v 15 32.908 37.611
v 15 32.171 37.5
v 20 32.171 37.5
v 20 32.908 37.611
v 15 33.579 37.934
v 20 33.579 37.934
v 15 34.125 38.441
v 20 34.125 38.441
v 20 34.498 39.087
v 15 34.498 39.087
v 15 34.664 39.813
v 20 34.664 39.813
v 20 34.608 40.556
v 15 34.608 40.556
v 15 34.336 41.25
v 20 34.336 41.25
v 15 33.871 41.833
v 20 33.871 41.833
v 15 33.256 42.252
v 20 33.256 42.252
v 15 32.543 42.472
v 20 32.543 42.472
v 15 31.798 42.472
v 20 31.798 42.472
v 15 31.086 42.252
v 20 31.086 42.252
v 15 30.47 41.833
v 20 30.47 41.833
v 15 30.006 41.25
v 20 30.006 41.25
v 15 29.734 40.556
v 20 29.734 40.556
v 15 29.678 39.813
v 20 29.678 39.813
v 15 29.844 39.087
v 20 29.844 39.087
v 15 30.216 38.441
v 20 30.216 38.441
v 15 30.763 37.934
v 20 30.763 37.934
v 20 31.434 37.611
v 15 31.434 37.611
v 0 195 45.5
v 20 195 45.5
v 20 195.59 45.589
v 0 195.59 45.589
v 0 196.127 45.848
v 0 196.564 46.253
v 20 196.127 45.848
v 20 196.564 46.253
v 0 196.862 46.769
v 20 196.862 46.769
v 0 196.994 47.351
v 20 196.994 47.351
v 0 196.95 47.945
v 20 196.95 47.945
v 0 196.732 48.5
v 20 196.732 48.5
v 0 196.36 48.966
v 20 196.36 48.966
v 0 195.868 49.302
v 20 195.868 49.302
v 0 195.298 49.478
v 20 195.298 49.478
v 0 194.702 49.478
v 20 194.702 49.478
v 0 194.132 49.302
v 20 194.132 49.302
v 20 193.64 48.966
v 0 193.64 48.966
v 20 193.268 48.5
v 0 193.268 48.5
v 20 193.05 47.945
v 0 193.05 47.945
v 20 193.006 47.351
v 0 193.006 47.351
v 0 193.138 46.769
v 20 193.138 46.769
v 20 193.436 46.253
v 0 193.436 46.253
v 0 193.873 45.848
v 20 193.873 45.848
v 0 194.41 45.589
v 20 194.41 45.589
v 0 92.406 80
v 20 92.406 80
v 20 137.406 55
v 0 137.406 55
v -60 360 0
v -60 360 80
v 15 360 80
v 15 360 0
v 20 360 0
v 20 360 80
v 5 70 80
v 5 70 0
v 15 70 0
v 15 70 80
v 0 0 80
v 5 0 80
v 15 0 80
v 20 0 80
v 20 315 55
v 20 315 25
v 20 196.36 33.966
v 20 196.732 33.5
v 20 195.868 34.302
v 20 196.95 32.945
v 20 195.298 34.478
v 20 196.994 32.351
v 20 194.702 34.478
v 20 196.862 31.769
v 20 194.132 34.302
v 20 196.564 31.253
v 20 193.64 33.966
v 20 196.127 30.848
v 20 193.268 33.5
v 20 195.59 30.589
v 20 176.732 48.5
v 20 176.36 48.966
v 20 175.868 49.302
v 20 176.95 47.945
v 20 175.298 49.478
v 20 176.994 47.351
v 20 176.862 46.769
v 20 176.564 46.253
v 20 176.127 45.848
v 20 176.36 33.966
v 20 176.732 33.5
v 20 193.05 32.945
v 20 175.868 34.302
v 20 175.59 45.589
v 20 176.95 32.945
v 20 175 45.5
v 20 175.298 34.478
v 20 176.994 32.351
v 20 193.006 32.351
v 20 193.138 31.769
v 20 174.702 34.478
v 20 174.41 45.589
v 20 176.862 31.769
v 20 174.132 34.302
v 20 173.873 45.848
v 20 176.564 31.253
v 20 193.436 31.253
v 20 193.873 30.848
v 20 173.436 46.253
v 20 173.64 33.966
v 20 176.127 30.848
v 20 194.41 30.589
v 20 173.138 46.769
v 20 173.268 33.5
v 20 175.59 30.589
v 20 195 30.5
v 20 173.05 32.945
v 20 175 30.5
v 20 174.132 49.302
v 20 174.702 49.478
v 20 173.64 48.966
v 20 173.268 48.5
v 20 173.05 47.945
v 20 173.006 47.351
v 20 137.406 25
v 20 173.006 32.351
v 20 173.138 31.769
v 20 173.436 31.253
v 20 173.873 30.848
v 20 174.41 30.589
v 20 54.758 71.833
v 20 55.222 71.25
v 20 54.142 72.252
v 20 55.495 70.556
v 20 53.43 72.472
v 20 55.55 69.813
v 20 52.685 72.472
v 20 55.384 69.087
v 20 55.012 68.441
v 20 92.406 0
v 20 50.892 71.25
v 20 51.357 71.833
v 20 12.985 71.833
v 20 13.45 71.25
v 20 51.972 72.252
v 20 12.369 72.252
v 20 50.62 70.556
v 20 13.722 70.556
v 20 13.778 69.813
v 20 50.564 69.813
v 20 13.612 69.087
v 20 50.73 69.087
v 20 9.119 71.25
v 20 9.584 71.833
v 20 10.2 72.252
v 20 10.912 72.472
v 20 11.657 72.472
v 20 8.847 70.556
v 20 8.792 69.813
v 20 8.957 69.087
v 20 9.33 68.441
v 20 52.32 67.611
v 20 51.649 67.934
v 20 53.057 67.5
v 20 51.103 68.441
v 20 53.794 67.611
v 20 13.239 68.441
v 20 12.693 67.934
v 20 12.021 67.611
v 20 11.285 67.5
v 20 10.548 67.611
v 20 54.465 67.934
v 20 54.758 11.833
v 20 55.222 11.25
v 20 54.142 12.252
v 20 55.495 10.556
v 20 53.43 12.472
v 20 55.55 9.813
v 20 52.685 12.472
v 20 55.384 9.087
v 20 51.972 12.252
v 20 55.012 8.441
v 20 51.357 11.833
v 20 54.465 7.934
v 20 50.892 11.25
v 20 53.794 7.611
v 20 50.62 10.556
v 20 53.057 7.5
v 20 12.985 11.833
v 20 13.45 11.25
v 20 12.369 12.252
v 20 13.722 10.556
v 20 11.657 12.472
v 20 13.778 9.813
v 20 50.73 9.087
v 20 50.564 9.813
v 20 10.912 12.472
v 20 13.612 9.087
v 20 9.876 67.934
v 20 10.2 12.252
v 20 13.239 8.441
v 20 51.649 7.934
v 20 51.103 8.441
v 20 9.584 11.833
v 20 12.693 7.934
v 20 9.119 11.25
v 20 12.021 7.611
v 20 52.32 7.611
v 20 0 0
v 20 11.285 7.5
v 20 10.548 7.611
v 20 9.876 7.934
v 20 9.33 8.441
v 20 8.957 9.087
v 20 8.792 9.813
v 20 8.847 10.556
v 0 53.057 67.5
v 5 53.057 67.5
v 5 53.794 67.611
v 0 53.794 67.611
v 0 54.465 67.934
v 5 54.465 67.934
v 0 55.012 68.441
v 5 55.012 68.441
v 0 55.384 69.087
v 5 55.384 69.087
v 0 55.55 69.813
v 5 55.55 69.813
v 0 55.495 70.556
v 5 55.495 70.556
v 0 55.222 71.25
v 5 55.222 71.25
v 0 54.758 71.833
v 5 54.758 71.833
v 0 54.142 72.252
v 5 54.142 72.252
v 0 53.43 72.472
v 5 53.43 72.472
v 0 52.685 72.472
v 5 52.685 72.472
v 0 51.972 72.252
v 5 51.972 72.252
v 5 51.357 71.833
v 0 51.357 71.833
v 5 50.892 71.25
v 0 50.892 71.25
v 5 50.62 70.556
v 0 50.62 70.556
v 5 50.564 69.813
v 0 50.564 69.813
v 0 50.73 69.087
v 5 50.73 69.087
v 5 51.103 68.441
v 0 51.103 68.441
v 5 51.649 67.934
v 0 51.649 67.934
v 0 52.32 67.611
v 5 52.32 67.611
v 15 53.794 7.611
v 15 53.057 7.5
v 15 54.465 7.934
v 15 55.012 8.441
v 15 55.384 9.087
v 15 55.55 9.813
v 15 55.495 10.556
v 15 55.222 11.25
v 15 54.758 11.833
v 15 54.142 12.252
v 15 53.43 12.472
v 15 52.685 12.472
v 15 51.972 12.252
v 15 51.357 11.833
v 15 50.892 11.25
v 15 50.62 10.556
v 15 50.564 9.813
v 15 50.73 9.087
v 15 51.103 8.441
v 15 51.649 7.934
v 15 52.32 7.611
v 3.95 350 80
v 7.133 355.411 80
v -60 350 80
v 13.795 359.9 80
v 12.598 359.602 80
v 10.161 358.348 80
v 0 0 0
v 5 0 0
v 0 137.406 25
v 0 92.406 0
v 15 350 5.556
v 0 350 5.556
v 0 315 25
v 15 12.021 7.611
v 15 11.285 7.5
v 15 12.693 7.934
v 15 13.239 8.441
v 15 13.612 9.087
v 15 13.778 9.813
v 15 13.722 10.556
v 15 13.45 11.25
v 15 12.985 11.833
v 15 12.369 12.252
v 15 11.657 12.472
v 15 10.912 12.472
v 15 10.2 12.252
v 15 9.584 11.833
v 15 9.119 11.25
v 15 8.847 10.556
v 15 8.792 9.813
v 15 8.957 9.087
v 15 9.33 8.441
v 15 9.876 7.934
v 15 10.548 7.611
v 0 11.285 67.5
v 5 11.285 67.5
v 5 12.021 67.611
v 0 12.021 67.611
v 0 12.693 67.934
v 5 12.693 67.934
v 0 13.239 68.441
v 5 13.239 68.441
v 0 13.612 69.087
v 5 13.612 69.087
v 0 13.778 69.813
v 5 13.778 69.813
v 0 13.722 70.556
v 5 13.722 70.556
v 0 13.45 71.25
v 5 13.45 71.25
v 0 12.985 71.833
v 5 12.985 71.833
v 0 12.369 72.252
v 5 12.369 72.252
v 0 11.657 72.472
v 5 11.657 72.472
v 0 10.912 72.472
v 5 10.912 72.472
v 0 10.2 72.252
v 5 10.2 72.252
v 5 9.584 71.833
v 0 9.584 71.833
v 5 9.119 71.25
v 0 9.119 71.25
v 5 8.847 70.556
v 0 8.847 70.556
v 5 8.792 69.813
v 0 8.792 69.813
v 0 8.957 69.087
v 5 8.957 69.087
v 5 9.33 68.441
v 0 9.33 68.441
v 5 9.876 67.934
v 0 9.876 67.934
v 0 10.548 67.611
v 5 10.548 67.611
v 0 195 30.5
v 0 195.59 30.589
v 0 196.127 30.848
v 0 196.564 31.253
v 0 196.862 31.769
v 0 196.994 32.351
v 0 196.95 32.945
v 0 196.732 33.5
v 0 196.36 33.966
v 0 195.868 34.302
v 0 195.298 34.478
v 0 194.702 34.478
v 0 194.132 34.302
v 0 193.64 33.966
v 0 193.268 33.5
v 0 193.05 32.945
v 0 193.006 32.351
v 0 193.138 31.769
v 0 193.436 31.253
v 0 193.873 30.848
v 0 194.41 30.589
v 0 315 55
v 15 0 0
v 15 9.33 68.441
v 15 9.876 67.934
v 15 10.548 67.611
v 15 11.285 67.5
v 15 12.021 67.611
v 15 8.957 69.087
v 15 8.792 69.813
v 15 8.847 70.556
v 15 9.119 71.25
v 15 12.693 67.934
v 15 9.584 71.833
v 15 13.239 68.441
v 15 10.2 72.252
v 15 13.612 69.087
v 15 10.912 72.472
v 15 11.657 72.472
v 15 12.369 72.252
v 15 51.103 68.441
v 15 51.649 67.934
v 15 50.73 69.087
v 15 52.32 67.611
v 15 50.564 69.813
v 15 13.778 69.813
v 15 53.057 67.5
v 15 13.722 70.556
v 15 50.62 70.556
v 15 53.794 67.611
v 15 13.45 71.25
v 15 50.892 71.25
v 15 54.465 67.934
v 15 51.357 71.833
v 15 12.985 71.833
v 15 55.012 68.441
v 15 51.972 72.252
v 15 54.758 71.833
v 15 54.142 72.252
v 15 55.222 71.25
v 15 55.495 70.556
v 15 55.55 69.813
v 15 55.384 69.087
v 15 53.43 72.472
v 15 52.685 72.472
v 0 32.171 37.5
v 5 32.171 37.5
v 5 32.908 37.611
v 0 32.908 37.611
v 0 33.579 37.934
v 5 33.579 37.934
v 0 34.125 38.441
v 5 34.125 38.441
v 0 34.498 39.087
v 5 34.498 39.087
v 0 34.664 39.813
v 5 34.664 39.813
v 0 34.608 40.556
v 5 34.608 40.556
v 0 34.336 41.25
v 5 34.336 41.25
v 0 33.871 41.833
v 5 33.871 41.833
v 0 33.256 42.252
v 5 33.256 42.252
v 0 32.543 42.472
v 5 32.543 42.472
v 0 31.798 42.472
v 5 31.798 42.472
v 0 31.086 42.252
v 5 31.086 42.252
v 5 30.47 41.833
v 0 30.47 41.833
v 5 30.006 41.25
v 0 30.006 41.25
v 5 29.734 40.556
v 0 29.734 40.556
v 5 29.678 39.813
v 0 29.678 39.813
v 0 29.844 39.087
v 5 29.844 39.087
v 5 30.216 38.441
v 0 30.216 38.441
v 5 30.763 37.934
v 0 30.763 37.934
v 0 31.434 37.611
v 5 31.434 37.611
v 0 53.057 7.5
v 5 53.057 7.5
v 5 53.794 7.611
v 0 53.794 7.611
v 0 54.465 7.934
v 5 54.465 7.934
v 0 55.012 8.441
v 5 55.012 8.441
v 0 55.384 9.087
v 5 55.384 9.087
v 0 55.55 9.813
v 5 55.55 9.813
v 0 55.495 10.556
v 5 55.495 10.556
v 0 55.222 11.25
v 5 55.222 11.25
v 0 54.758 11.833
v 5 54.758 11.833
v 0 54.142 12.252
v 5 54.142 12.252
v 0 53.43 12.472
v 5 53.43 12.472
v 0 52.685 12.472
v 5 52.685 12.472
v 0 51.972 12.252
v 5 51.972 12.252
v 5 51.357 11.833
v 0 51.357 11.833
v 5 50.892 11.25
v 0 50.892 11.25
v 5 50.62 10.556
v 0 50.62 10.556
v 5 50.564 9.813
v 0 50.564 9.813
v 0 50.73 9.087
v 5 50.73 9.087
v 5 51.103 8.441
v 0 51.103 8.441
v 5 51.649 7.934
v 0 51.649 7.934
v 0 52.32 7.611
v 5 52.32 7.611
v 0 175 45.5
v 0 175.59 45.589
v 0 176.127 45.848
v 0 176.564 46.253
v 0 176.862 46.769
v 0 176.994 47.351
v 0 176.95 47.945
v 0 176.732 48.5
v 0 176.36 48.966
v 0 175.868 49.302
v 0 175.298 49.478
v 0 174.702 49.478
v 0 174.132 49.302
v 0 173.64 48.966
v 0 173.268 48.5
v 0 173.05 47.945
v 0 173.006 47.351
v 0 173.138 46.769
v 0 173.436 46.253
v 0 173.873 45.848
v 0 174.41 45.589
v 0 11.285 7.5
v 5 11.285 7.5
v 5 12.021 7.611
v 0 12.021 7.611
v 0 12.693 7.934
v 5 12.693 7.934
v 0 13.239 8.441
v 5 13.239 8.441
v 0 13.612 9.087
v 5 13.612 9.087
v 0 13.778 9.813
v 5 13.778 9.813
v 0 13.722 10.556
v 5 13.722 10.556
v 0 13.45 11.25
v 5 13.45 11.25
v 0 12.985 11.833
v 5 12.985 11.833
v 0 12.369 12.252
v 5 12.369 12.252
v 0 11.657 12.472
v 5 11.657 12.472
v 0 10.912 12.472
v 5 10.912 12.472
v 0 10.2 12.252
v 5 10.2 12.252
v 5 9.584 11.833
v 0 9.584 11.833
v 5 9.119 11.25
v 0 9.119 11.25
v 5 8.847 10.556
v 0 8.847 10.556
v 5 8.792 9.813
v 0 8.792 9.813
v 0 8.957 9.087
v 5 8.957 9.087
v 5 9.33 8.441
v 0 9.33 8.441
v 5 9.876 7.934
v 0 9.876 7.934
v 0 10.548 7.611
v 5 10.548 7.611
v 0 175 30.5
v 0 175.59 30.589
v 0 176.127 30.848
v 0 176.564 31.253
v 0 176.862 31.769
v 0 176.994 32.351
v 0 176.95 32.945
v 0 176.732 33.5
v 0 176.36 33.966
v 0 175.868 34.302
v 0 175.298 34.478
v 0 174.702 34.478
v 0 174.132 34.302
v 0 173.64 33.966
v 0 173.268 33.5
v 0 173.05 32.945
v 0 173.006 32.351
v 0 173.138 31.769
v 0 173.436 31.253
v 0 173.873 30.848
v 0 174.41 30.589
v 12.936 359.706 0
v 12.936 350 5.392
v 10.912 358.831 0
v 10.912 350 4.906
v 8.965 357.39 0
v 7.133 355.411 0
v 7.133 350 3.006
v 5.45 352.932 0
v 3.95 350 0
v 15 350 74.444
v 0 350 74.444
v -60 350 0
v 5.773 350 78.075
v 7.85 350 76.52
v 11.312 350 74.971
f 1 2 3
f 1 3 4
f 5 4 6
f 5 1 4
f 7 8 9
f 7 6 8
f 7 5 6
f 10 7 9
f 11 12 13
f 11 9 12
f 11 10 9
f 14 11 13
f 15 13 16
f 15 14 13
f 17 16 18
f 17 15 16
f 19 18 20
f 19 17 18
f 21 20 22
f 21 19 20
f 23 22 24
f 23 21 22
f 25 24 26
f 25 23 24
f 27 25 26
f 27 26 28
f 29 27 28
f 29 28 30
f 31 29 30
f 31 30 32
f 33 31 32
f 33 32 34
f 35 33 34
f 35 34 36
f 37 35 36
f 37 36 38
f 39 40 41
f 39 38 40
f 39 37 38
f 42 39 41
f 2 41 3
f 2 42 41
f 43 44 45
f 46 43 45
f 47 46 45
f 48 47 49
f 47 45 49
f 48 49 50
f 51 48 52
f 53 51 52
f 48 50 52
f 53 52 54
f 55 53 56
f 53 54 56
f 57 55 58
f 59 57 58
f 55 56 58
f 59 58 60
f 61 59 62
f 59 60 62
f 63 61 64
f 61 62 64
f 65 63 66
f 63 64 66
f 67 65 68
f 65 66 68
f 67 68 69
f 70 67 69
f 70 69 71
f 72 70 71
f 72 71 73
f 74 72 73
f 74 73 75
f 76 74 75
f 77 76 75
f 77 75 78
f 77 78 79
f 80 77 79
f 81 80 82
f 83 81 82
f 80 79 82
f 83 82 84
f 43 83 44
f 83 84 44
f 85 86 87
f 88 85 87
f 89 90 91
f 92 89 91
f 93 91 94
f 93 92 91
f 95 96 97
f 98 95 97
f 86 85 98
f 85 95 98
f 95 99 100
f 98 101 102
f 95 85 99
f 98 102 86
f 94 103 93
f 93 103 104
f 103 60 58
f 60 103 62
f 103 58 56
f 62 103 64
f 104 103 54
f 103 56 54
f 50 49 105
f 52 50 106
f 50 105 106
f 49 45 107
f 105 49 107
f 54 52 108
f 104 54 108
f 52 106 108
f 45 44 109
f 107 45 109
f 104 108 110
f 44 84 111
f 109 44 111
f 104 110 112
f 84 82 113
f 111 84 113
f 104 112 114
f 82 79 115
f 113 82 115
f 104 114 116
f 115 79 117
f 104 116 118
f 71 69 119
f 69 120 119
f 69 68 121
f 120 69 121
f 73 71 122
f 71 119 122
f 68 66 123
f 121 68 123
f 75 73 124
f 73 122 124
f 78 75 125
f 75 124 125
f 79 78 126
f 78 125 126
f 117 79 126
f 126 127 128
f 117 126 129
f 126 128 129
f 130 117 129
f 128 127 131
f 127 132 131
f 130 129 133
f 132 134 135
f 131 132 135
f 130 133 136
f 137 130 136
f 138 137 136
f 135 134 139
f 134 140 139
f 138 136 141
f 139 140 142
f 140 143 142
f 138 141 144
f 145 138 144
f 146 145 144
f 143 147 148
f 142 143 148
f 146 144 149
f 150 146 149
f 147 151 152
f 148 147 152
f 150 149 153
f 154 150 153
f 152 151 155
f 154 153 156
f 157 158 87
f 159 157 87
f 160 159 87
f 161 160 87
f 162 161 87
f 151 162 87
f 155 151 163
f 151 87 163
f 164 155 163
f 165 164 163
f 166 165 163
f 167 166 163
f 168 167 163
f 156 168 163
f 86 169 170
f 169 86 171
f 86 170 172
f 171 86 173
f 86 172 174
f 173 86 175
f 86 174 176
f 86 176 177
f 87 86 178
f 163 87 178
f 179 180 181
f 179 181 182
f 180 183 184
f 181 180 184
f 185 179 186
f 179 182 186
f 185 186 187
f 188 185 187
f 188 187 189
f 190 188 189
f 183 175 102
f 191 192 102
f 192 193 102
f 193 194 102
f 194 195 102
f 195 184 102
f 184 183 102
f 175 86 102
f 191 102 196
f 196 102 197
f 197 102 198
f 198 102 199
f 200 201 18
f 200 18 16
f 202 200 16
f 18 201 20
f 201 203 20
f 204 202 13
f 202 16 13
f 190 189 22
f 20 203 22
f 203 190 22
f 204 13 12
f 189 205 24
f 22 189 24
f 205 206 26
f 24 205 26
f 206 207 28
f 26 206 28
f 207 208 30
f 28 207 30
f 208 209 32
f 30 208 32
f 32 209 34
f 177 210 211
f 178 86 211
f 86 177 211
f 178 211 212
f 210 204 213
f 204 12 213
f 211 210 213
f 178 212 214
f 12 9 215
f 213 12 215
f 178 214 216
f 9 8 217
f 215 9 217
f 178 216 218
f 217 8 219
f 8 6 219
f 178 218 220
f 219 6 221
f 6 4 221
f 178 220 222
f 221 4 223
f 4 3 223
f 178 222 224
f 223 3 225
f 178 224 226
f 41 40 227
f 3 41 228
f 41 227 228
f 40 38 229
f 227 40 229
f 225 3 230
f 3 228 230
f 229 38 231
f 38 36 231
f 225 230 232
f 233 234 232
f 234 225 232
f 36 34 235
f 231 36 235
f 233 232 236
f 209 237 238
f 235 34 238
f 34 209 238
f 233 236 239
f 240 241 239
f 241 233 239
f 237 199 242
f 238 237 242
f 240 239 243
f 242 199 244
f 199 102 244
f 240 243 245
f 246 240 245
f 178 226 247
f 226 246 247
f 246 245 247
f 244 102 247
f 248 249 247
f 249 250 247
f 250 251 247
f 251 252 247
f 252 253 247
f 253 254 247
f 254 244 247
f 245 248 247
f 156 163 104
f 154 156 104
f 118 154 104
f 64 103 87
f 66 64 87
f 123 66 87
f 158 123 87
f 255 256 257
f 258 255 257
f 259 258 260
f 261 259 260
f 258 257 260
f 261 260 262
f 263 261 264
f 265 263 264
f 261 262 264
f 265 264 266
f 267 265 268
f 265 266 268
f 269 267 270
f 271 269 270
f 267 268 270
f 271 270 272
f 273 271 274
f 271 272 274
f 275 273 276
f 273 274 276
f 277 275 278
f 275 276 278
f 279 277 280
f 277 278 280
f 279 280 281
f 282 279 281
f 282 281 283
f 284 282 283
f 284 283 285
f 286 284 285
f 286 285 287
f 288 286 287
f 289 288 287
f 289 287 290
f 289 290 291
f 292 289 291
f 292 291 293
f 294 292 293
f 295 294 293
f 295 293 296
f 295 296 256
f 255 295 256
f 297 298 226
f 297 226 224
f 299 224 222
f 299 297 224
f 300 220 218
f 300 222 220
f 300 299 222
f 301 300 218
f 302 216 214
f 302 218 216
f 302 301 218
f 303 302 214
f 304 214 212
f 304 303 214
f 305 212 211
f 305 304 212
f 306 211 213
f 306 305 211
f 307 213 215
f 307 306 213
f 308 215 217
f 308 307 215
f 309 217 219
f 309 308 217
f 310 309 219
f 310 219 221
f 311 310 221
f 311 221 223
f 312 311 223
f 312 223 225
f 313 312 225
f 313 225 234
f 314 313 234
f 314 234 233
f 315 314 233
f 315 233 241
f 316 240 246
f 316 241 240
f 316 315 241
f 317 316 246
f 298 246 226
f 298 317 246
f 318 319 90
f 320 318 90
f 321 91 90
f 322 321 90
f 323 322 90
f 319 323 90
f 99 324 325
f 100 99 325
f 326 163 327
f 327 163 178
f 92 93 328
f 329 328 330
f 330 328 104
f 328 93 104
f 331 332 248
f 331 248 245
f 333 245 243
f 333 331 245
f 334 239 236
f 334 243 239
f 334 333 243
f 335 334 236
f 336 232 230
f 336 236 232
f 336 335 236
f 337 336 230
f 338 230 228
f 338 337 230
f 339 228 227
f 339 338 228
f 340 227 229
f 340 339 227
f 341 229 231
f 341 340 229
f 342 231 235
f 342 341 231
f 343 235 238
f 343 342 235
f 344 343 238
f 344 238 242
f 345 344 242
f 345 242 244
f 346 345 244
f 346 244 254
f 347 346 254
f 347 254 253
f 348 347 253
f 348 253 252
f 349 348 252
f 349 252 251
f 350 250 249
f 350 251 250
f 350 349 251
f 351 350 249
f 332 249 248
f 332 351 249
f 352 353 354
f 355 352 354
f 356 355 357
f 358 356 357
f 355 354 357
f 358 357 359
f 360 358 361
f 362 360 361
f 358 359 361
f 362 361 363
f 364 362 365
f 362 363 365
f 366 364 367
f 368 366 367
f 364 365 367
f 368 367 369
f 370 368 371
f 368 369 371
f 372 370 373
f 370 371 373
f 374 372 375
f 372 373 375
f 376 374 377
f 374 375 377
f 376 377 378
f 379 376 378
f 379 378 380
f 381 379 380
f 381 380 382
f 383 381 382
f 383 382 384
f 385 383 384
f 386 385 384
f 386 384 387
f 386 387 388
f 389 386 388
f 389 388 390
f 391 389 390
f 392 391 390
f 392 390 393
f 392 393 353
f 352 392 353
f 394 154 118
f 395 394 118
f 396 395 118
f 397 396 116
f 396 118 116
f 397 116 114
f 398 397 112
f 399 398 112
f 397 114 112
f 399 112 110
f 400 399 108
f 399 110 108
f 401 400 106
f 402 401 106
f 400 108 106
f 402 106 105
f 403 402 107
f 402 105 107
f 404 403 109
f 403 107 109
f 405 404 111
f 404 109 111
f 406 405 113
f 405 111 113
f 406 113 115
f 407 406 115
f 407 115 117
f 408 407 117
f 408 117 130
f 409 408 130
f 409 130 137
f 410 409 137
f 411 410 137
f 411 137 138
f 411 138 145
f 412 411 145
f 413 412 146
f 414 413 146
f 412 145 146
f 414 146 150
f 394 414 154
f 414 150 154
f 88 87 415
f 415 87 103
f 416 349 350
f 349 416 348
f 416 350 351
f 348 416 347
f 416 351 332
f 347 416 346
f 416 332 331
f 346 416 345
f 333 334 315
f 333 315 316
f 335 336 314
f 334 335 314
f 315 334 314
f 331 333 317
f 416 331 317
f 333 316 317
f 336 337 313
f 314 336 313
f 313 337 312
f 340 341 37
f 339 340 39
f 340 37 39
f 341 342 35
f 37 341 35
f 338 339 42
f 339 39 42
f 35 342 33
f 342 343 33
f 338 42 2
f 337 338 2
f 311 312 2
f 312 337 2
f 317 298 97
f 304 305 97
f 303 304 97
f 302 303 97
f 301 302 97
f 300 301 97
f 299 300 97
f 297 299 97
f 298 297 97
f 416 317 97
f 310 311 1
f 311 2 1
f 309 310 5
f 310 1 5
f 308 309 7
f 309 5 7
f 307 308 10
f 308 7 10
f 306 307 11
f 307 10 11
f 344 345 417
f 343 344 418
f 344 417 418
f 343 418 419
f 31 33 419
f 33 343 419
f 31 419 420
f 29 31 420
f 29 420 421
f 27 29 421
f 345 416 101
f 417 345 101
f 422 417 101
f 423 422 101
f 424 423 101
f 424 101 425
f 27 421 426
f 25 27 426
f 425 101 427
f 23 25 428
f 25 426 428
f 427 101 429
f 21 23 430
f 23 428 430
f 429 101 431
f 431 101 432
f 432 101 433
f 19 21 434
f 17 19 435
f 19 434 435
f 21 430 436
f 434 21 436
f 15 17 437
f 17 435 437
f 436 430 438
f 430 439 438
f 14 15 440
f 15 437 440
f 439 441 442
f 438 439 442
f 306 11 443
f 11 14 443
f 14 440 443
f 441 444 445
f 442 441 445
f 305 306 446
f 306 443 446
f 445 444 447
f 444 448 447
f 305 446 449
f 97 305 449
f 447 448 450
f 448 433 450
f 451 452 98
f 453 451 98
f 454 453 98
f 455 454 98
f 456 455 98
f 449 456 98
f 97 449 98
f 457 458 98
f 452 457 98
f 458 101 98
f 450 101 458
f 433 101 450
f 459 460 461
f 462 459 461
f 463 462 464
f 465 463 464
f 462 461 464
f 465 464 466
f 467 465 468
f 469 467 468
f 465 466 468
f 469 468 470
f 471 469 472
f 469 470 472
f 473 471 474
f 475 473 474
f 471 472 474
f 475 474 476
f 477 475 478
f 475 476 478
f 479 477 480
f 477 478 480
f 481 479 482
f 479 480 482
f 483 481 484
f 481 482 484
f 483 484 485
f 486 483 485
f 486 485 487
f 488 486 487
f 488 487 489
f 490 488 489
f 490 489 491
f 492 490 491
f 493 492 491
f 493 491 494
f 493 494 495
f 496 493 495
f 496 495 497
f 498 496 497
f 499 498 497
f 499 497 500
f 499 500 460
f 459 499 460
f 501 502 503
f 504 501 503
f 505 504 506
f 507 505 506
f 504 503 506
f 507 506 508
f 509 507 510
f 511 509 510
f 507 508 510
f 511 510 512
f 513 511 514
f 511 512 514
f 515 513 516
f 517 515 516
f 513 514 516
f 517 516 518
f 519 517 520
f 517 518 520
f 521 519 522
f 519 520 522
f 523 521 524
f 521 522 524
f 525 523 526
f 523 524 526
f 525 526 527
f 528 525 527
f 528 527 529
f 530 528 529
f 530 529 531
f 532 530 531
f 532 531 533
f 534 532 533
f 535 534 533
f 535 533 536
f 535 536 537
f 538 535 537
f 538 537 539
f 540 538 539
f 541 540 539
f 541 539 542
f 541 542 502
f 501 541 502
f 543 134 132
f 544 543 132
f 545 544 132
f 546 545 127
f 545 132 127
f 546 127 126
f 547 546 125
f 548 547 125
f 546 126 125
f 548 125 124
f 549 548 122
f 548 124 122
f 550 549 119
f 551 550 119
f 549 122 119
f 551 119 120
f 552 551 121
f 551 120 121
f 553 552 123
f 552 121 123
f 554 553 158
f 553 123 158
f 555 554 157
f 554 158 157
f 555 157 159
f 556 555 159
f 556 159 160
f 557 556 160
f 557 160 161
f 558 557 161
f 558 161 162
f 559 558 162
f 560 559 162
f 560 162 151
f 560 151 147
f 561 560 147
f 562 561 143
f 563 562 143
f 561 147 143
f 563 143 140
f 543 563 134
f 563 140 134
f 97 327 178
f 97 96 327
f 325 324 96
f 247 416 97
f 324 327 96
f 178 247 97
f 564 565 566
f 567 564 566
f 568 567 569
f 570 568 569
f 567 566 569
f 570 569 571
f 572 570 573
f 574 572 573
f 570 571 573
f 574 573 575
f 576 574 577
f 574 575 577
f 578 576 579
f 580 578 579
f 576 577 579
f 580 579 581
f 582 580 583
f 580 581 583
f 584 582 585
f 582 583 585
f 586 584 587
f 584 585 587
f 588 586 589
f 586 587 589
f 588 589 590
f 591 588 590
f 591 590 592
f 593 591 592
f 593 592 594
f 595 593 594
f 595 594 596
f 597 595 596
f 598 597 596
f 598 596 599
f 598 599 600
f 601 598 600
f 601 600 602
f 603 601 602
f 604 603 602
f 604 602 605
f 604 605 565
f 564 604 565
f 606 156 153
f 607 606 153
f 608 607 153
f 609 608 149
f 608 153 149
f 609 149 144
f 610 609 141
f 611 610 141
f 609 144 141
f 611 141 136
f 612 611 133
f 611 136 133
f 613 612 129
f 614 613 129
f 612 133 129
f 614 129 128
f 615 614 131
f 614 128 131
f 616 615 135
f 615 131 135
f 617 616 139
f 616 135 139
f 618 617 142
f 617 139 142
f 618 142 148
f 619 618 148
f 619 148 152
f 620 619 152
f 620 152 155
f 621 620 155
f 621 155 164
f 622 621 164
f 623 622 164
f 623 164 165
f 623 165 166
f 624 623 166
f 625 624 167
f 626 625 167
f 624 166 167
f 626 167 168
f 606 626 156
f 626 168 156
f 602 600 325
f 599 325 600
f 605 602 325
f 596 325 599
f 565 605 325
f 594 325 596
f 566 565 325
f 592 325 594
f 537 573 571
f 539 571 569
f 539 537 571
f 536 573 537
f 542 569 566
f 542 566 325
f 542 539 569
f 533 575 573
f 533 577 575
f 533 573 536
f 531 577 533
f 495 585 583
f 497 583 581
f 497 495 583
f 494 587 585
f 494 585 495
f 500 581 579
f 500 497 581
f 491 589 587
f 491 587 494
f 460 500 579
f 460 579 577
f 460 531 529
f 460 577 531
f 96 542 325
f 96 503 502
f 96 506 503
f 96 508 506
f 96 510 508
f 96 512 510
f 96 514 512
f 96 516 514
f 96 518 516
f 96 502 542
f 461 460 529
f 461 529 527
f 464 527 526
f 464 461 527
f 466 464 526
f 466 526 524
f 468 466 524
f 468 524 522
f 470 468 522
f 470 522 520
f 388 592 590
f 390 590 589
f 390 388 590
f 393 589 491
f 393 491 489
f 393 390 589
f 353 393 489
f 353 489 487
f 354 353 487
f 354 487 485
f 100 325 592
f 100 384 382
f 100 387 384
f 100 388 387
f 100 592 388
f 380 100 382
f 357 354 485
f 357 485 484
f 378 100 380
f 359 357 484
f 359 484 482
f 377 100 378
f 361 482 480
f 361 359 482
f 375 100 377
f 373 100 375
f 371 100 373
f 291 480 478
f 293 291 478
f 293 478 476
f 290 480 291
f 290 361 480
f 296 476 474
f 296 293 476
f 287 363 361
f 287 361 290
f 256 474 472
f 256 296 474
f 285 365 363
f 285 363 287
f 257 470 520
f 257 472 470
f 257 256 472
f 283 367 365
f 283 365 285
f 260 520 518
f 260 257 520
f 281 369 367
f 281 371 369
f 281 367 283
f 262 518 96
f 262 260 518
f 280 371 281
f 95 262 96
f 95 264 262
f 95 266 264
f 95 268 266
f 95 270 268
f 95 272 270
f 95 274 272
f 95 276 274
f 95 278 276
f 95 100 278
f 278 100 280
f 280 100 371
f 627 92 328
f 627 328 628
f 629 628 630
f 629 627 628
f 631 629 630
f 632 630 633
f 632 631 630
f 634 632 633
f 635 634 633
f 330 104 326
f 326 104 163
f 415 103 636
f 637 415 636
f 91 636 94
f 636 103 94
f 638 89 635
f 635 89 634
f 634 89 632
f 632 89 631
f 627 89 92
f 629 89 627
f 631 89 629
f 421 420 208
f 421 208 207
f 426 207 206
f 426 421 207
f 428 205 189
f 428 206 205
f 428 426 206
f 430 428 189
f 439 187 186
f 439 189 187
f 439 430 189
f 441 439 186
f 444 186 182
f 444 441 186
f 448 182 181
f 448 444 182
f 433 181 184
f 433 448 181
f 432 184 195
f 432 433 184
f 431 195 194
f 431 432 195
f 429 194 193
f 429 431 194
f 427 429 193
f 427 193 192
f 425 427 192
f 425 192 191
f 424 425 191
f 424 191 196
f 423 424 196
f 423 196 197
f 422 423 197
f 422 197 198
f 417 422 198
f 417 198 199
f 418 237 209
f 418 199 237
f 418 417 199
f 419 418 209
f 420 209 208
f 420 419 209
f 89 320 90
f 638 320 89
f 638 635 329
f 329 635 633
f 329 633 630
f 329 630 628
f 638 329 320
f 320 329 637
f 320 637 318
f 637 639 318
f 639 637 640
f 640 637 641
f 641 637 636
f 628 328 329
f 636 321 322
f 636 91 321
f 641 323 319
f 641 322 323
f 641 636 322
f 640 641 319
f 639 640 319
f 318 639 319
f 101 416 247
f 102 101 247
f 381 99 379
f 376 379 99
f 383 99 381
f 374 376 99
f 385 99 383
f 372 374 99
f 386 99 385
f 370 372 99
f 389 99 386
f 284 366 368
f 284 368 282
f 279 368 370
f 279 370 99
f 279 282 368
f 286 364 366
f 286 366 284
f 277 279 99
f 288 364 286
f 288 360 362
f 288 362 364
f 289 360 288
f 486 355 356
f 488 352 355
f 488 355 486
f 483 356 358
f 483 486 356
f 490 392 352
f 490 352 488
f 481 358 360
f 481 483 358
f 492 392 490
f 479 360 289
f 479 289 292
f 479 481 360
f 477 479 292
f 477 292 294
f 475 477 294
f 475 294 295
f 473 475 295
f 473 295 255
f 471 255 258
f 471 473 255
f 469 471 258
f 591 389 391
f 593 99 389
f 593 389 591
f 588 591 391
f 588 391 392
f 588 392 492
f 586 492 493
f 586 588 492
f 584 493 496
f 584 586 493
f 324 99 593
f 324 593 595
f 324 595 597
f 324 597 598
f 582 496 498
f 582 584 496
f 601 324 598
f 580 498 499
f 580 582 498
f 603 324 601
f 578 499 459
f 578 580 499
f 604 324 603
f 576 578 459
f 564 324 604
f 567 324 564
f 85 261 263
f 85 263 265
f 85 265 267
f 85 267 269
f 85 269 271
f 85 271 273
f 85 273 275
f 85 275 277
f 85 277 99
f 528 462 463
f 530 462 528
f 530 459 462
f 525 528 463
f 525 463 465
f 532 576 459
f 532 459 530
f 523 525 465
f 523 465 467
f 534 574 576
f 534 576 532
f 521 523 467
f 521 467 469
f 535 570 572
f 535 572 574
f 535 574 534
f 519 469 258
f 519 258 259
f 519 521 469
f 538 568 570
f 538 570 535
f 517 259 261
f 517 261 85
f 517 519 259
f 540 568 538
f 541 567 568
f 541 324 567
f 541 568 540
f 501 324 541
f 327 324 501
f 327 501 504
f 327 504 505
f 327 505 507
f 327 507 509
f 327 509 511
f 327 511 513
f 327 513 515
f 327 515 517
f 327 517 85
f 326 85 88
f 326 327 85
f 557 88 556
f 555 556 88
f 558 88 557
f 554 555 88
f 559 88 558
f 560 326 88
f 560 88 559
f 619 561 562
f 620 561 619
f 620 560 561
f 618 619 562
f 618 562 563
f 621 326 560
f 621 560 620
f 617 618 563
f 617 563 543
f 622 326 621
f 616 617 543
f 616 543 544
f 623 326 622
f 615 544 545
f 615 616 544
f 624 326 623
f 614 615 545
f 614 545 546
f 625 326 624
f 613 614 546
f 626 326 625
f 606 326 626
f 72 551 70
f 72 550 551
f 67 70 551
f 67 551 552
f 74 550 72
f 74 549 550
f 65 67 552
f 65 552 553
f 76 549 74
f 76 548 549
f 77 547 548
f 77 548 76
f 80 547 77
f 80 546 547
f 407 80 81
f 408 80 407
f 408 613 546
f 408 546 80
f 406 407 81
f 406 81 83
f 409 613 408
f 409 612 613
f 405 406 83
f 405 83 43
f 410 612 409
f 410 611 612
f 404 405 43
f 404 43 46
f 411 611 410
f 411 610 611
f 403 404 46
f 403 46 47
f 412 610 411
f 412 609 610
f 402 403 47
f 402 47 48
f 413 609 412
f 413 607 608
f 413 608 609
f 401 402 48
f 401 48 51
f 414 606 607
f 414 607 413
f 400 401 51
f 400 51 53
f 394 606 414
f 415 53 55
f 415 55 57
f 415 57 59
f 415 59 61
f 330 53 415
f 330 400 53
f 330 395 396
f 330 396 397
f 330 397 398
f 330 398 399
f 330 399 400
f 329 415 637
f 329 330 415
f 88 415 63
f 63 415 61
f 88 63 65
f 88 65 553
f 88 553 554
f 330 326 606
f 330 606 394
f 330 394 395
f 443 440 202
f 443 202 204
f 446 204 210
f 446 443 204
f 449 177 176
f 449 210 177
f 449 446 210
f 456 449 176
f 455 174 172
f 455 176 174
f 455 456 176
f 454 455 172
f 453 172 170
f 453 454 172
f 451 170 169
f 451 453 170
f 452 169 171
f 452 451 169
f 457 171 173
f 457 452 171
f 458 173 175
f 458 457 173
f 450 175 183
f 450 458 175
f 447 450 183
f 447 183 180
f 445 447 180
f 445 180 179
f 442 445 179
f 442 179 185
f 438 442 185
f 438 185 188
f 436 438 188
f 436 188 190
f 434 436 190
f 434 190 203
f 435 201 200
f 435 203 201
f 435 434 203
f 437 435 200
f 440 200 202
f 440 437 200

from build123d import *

# Parameters (mm, degrees)
SUPPORT_BALISE_W                           = 20
SUPPORT_BALISE_H                           = 350
SUPPORT_BALISE_BOSSAGE_DEPTH               = 80
ESQUISSE3_W                                = 80
ESQUISSE3_H                                = 80
SUPPORT_CHEVAL_ENLEVEMENT_DE_MATIERE_DEPTH = 10
ESQUISSE8_W                                = 10
ESQUISSE8_H                                = 70
SUPPORT_CHEVAL_DEPTH                       = 80
VIS_REACH                                  = 376.466
SERRAGE_VIS_R                              = 2.5
VIS_DIRECTION_2_DEPTH                      = 375.466286867
ENL_V_MAT_EXTRU_5_DEPTH                    = 20
POUR_IMPRESSION_R                          = 15
FIXATION_POUR_ASSEMBLAGE_R                 = 2
VIS_POUR_ASSEMBLAGE_DEPTH                  = 20


with BuildPart() as part:
    # Support Balise → Support balise bossage (new body)
    with BuildSketch(Plane.XY):
        with Locations((10, 175)):
            Rectangle(SUPPORT_BALISE_W, SUPPORT_BALISE_H)
    extrude(amount=SUPPORT_BALISE_BOSSAGE_DEPTH)

    # Esquisse3 → Support Cheval enlevement de matiere (add)
    with BuildSketch(Plane(origin=(0, 350, 0), x_dir=(1, 0, 0), z_dir=(0, 1, 0))):
        with Locations((-20, -40)):
            Rectangle(ESQUISSE3_W, ESQUISSE3_H)
    extrude(amount=SUPPORT_CHEVAL_ENLEVEMENT_DE_MATIERE_DEPTH)

    # Esquisse8 → Support Cheval (cut)
    with BuildSketch(Plane.XY.offset(80)):
        with Locations((10, 35)):
            Rectangle(ESQUISSE8_W, ESQUISSE8_H)
    extrude(amount=-SUPPORT_CHEVAL_DEPTH, mode=Mode.SUBTRACT)

    # Vis: up to this face of the body (flat: up to its plane)
    vis_end = Plane(part.part.faces().sort_by_distance((0, 175, 40))[0])
    # Serrage vis → Vis (cut, up to the picked face)
    with BuildSketch(Plane(origin=(5, 0, 0), x_dir=(0, 0, -1), z_dir=(1, 0, 0)), mode=Mode.PRIVATE) as vis_sk1:
        with Locations((-70, 11.284552026)):
            Circle(SERRAGE_VIS_R)
    vis_tool1 = split(extrude(vis_sk1.sketch, amount=-VIS_REACH, mode=Mode.PRIVATE), bisect_by=vis_end, keep=Keep.BOTH, mode=Mode.PRIVATE)
    # Serrage vis → Vis (cut, up to the picked face)
    with BuildSketch(Plane(origin=(5, 0, 0), x_dir=(0, 0, -1), z_dir=(1, 0, 0)), mode=Mode.PRIVATE) as vis_sk2:
        with Locations((-70, 53.057184379)):
            Circle(SERRAGE_VIS_R)
    vis_tool2 = split(extrude(vis_sk2.sketch, amount=-VIS_REACH, mode=Mode.PRIVATE), bisect_by=vis_end, keep=Keep.BOTH, mode=Mode.PRIVATE)
    # Serrage vis → Vis (cut, up to the picked face)
    with BuildSketch(Plane(origin=(5, 0, 0), x_dir=(0, 0, -1), z_dir=(1, 0, 0)), mode=Mode.PRIVATE) as vis_sk3:
        with Locations((-10, 53.057184379)):
            Circle(SERRAGE_VIS_R)
    vis_tool3 = split(extrude(vis_sk3.sketch, amount=-VIS_REACH, mode=Mode.PRIVATE), bisect_by=vis_end, keep=Keep.BOTH, mode=Mode.PRIVATE)
    # Serrage vis → Vis (cut, up to the picked face)
    with BuildSketch(Plane(origin=(5, 0, 0), x_dir=(0, 0, -1), z_dir=(1, 0, 0)), mode=Mode.PRIVATE) as vis_sk4:
        with Locations((-10, 11.284552026)):
            Circle(SERRAGE_VIS_R)
    vis_tool4 = split(extrude(vis_sk4.sketch, amount=-VIS_REACH, mode=Mode.PRIVATE), bisect_by=vis_end, keep=Keep.BOTH, mode=Mode.PRIVATE)
    # Serrage vis → Vis (cut, up to the picked face)
    with BuildSketch(Plane(origin=(5, 0, 0), x_dir=(0, 0, -1), z_dir=(1, 0, 0)), mode=Mode.PRIVATE) as vis_sk5:
        with Locations((-40, 32.170868202)):
            Circle(SERRAGE_VIS_R)
    vis_tool5 = split(extrude(vis_sk5.sketch, amount=-VIS_REACH, mode=Mode.PRIVATE), bisect_by=vis_end, keep=Keep.BOTH, mode=Mode.PRIVATE)
    add(vis_tool1.solids().sort_by(Axis((5, 11.284552, 70), (-1, 0, 0)))[0], mode=Mode.SUBTRACT)
    add(vis_tool2.solids().sort_by(Axis((5, 53.057184, 70), (-1, 0, 0)))[0], mode=Mode.SUBTRACT)
    add(vis_tool3.solids().sort_by(Axis((5, 53.057184, 10), (-1, 0, 0)))[0], mode=Mode.SUBTRACT)
    add(vis_tool4.solids().sort_by(Axis((5, 11.284552, 10), (-1, 0, 0)))[0], mode=Mode.SUBTRACT)
    add(vis_tool5.solids().sort_by(Axis((5, 32.170868, 40), (-1, 0, 0)))[0], mode=Mode.SUBTRACT)

    # Serrage vis → Vis direction 2 (cut)
    with BuildSketch(Plane(origin=(5, 0, 0), x_dir=(0, 0, -1), z_dir=(1, 0, 0))):
        with Locations((-70, 11.284552026)):
            Circle(SERRAGE_VIS_R)
        with Locations((-70, 53.057184379)):
            Circle(SERRAGE_VIS_R)
        with Locations((-10, 53.057184379)):
            Circle(SERRAGE_VIS_R)
        with Locations((-10, 11.284552026)):
            Circle(SERRAGE_VIS_R)
        with Locations((-40, 32.170868202)):
            Circle(SERRAGE_VIS_R)
    extrude(amount=VIS_DIRECTION_2_DEPTH, mode=Mode.SUBTRACT)

    # Design → Enlèv. mat.-Extru.5 (cut)
    with BuildSketch(Plane(origin=(20, 0, 0), x_dir=(0, 0, -1), z_dir=(1, 0, 0))):
        Polygon((-55, 315), (-80, 360), (-80, 92.406088827), (-55, 137.406088827), align=None)
        Polygon((0, 92.406088827), (0, 360), (-25, 315), (-25, 137.406088827), align=None)
    extrude(amount=-ENL_V_MAT_EXTRU_5_DEPTH, mode=Mode.SUBTRACT)

    # Pour Impression
    # the kernel refuses this fillet: 15 mm, written as the material it adds along each edge
    with BuildSketch(Plane(origin=(0, 392.780897855, -18.211609919), x_dir=(1, 0, 0), z_dir=(0, -0.8741572761215375, 0.48564293117863266))) as pour_impression_piece_1_section:
        with BuildLine():
            CenterArc((POUR_IMPRESSION_R, -POUR_IMPRESSION_R), POUR_IMPRESSION_R, 90, 90)
            Line((0, -POUR_IMPRESSION_R), (0, 0))
            Line((0, 0), (POUR_IMPRESSION_R, 0))
        make_face()
    pour_impression_piece_1 = extrude(amount=86.439589046, mode=Mode.PRIVATE)
    pour_impression_piece_1 = split(pour_impression_piece_1, bisect_by=Plane(origin=(4.741525676, 350, 2.029382941), z_dir=(0, 1, 0)), keep=Keep.TOP, mode=Mode.PRIVATE)
    pour_impression_piece_1 = split(pour_impression_piece_1, bisect_by=Plane(origin=(4.741525676, 353.652889294, 0), z_dir=(0, 0, 1)), keep=Keep.TOP, mode=Mode.PRIVATE)
    add(pour_impression_piece_1)
    with BuildSketch(Plane(origin=(0, 317.219102145, 56.232834525), x_dir=(1, 0, 0), z_dir=(0, 0.8741572761215377, 0.4856429311786322))) as pour_impression_piece_2_section:
        with BuildLine():
            CenterArc((POUR_IMPRESSION_R, -POUR_IMPRESSION_R), POUR_IMPRESSION_R, 90, 90)
            Line((0, -POUR_IMPRESSION_R), (0, 0))
            Line((0, 0), (POUR_IMPRESSION_R, 0))
        make_face()
    pour_impression_piece_2 = extrude(amount=86.439589046, mode=Mode.PRIVATE)
    pour_impression_piece_2 = split(pour_impression_piece_2, bisect_by=Plane(origin=(4.741525676, 350, 77.970617059), z_dir=(0, 1, 0)), keep=Keep.TOP, mode=Mode.PRIVATE)
    pour_impression_piece_2 = split(pour_impression_piece_2, bisect_by=Plane(origin=(4.741525676, 353.652889294, 80), z_dir=(0, 0, -1)), keep=Keep.TOP, mode=Mode.PRIVATE)
    add(pour_impression_piece_2)

    # Fixation pour assemblage → Vis pour Assemblage (cut)
    with BuildSketch(Plane(origin=(20, 0, 0), x_dir=(0, 0, -1), z_dir=(1, 0, 0))):
        with Locations((-47.5, 195)):
            Circle(FIXATION_POUR_ASSEMBLAGE_R)
        with Locations((-32.5, 195)):
            Circle(FIXATION_POUR_ASSEMBLAGE_R)
        with Locations((-32.5, 175)):
            Circle(FIXATION_POUR_ASSEMBLAGE_R)
        with Locations((-47.5, 175)):
            Circle(FIXATION_POUR_ASSEMBLAGE_R)
    extrude(amount=-VIS_POUR_ASSEMBLAGE_DEPTH, mode=Mode.SUBTRACT)


solid = part.part
